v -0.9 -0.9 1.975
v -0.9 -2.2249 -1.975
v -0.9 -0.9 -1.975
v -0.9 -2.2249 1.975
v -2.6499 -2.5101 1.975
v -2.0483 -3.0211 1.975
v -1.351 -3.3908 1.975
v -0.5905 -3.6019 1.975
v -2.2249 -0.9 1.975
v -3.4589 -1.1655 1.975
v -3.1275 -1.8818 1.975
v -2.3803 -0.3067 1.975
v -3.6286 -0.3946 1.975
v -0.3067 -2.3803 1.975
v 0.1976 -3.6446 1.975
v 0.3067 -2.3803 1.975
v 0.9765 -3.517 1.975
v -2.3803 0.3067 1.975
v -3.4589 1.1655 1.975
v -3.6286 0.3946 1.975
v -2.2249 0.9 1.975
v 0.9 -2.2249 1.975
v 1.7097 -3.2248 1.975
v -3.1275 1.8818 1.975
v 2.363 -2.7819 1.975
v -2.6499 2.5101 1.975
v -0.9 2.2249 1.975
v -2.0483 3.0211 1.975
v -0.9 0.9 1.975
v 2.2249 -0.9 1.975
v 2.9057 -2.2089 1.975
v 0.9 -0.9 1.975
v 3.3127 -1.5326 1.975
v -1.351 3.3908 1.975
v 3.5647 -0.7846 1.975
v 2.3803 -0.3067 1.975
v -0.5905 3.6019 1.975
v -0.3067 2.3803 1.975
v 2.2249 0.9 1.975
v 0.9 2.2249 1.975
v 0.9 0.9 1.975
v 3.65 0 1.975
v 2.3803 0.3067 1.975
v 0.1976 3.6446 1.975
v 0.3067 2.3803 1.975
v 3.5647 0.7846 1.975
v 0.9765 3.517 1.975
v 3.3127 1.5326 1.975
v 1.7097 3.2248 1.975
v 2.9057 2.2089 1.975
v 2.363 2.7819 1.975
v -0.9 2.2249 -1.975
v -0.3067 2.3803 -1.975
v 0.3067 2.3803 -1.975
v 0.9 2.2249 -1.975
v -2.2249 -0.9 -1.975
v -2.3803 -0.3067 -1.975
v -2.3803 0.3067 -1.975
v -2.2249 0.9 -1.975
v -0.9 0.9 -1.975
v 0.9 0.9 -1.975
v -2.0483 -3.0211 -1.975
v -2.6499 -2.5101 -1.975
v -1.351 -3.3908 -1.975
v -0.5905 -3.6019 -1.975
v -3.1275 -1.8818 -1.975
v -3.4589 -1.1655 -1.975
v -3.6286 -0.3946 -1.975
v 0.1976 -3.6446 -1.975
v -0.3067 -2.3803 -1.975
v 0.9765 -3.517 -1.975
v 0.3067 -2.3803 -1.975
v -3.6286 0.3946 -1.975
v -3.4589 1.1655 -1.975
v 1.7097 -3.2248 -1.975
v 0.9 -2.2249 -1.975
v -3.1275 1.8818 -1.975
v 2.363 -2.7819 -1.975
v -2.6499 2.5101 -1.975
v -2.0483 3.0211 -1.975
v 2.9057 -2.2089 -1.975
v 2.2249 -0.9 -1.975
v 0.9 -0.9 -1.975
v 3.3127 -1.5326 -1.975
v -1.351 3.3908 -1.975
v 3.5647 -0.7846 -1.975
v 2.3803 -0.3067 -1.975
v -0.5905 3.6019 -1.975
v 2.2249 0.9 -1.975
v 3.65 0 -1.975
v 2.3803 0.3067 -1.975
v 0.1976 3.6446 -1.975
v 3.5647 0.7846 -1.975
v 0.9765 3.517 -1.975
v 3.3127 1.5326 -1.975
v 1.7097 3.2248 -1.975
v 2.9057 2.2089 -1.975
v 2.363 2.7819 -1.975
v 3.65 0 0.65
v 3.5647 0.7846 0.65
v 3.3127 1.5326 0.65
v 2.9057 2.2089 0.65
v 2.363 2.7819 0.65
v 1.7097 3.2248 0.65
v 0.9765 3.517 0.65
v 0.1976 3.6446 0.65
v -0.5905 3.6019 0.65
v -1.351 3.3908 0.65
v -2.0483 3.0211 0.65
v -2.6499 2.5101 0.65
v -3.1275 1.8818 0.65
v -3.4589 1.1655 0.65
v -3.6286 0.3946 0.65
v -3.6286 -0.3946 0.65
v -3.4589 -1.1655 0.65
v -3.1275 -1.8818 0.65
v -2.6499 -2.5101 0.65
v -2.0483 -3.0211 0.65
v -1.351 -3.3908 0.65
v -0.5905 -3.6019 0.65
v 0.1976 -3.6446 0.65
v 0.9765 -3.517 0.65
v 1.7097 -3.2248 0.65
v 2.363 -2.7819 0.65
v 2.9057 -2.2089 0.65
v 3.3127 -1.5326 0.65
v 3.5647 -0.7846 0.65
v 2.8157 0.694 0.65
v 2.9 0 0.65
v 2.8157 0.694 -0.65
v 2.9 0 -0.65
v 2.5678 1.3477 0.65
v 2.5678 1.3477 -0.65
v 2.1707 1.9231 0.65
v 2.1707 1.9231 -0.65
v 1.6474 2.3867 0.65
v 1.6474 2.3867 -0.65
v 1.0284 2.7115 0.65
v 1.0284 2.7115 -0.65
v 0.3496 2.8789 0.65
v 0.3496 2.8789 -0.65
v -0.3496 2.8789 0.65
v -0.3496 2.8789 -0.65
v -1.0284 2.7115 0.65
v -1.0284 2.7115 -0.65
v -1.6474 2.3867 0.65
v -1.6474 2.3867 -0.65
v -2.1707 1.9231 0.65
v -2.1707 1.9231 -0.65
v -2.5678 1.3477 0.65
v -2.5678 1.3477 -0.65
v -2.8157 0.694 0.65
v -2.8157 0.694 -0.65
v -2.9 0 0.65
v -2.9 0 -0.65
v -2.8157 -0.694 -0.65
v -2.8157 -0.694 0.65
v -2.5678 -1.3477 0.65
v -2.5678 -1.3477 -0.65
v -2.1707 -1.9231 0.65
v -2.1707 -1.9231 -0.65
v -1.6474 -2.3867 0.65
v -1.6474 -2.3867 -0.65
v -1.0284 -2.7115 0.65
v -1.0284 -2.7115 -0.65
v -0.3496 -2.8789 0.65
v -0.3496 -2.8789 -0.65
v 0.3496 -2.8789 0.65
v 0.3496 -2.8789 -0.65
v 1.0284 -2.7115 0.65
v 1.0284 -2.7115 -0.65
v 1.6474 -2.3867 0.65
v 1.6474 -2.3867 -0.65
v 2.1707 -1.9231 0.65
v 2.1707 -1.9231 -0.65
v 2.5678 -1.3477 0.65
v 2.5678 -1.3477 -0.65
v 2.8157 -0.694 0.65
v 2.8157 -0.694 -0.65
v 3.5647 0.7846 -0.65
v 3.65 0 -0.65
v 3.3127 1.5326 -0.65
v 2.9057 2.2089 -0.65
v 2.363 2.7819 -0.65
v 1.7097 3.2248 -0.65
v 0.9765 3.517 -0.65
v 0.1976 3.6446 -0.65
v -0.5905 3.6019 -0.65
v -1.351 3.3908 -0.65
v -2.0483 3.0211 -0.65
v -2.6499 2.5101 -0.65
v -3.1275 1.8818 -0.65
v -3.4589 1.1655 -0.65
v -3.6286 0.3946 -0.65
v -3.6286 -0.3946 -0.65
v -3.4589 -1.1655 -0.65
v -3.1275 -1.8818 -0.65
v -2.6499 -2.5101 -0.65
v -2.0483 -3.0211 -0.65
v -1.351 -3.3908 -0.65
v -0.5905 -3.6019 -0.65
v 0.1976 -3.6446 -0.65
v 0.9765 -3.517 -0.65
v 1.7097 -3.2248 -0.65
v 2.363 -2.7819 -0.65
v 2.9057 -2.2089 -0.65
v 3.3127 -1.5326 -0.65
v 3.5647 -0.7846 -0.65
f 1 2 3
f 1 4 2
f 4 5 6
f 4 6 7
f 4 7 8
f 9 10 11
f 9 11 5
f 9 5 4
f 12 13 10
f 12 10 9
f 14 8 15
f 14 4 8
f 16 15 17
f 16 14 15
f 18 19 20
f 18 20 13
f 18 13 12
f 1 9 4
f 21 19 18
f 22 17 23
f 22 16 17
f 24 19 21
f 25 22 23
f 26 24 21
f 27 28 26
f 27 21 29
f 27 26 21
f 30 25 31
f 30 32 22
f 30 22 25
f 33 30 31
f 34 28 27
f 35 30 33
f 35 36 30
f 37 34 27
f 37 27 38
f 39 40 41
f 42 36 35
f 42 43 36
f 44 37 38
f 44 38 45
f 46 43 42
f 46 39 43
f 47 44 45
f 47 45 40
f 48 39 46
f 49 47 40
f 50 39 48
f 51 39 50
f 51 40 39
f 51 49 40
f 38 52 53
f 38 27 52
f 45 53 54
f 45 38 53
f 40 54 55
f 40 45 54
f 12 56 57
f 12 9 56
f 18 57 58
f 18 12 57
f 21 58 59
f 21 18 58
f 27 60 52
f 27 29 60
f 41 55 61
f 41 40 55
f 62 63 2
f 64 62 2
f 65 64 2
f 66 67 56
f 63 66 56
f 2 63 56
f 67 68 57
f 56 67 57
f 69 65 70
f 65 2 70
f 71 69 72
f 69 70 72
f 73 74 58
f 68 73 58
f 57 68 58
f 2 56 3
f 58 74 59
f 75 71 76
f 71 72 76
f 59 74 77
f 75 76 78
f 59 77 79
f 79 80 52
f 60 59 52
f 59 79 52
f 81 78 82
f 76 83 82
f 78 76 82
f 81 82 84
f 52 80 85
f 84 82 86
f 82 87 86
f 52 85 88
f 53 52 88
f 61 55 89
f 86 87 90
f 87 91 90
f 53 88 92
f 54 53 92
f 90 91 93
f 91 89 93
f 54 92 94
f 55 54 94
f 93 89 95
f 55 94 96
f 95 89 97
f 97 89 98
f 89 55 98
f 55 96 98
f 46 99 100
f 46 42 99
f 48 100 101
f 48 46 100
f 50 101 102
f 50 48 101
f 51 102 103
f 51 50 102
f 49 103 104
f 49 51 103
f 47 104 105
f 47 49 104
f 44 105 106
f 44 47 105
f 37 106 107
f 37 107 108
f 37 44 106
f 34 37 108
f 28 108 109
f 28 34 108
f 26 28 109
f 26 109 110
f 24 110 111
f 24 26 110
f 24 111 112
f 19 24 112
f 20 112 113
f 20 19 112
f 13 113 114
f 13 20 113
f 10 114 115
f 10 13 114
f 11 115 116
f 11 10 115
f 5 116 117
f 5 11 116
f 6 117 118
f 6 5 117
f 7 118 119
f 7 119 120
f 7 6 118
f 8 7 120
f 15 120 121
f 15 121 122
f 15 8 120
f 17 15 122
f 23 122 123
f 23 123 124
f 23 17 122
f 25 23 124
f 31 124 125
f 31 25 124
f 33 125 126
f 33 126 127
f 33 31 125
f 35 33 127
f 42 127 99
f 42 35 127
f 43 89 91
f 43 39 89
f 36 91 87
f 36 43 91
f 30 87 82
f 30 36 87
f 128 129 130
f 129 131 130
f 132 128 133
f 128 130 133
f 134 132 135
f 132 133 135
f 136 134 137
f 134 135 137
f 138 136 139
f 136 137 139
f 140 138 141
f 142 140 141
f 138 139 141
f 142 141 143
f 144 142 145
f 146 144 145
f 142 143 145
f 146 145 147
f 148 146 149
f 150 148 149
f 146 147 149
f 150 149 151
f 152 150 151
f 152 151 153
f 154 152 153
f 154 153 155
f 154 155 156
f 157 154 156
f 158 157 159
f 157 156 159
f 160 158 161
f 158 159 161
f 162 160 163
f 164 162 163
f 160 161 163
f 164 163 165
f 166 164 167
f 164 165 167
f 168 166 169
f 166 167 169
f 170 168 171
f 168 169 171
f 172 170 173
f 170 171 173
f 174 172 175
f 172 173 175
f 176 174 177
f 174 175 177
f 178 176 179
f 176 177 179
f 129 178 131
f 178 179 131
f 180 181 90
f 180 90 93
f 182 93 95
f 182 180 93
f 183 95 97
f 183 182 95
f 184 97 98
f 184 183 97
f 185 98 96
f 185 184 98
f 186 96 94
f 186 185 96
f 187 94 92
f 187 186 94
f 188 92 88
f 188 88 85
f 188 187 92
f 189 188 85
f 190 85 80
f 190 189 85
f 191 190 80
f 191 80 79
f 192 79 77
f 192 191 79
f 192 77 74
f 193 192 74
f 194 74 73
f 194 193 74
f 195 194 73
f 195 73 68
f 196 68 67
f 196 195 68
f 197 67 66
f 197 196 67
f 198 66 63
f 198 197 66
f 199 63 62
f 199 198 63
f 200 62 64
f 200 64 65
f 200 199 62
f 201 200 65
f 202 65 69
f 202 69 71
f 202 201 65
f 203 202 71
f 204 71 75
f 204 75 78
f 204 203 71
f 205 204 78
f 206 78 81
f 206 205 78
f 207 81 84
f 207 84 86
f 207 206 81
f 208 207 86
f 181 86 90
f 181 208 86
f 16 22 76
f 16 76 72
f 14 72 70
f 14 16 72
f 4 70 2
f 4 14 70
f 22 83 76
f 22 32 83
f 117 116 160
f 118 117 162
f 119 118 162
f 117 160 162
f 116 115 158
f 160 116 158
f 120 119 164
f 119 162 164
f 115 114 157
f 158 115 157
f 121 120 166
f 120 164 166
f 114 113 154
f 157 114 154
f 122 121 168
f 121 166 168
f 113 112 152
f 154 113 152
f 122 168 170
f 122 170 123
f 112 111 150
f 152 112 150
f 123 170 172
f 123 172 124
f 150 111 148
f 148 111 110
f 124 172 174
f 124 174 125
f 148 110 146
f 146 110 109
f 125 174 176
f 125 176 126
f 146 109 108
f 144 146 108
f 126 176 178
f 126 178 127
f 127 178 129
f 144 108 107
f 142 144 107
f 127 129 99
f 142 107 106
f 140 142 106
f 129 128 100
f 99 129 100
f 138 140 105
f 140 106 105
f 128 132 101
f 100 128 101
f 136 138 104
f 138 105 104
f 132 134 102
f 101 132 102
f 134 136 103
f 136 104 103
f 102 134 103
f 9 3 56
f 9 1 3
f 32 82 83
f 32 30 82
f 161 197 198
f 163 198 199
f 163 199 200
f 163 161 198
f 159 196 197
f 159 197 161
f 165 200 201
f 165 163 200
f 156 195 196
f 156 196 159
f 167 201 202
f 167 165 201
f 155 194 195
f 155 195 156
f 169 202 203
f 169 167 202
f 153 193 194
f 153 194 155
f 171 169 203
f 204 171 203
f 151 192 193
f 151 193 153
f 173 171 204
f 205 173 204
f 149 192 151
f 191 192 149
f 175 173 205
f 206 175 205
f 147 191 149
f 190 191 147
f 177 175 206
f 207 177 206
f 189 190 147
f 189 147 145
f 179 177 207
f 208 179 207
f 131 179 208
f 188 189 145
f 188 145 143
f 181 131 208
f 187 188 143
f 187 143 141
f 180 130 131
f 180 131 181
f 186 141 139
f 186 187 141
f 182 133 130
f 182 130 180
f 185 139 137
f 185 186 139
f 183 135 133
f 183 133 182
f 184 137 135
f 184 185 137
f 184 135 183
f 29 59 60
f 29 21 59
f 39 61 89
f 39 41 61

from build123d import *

# Parameters (mm, degrees)
SKETCH1_R           = 3.65
BOSS_EXTRUDE1_DEPTH = 1.975
SKETCH2_OUTSIDE_W   = 11.51
SKETCH2_OUTSIDE_H   = 11.51
SKETCH2_OUTSIDE_R   = 2.9
CUT_EXTRUDE1_DEPTH  = 0.65


with BuildPart() as part:
    # Sketch1 → Boss-Extrude1 (new, symmetric)
    with BuildSketch(Plane.XY):
        Circle(SKETCH1_R)
        with BuildLine():
            ThreePointArc((0.9, -2.224859546), (0, -2.4), (-0.9, -2.224859546))
            Line((-0.9, -2.224859546), (-0.9, -0.9))
            Line((-0.9, -0.9), (-2.224859546, -0.9))
            ThreePointArc((-2.224859546, -0.9), (-2.4, 0), (-2.224859546, 0.9))
            Line((-2.224859546, 0.9), (-0.9, 0.9))
            Line((-0.9, 0.9), (-0.9, 2.224859546))
            ThreePointArc((-0.9, 2.224859546), (0, 2.4), (0.9, 2.224859546))
            Line((0.9, 2.224859546), (0.9, 0.9))
            Line((0.9, 0.9), (2.224859546, 0.9))
            ThreePointArc((2.224859546, 0.9), (2.4, 0), (2.224859546, -0.9))
            Line((2.224859546, -0.9), (0.9, -0.9))
            Line((0.9, -0.9), (0.9, -2.224859546))
        make_face(mode=Mode.SUBTRACT)
    extrude(amount=BOSS_EXTRUDE1_DEPTH, both=True)

    # Sketch2 outside → Cut-Extrude1 (cut, symmetric)
    with BuildSketch(Plane.XY):
        Rectangle(SKETCH2_OUTSIDE_W, SKETCH2_OUTSIDE_H)
        Circle(SKETCH2_OUTSIDE_R, mode=Mode.SUBTRACT)
    extrude(amount=CUT_EXTRUDE1_DEPTH, both=True, mode=Mode.SUBTRACT)


solid = part.part
